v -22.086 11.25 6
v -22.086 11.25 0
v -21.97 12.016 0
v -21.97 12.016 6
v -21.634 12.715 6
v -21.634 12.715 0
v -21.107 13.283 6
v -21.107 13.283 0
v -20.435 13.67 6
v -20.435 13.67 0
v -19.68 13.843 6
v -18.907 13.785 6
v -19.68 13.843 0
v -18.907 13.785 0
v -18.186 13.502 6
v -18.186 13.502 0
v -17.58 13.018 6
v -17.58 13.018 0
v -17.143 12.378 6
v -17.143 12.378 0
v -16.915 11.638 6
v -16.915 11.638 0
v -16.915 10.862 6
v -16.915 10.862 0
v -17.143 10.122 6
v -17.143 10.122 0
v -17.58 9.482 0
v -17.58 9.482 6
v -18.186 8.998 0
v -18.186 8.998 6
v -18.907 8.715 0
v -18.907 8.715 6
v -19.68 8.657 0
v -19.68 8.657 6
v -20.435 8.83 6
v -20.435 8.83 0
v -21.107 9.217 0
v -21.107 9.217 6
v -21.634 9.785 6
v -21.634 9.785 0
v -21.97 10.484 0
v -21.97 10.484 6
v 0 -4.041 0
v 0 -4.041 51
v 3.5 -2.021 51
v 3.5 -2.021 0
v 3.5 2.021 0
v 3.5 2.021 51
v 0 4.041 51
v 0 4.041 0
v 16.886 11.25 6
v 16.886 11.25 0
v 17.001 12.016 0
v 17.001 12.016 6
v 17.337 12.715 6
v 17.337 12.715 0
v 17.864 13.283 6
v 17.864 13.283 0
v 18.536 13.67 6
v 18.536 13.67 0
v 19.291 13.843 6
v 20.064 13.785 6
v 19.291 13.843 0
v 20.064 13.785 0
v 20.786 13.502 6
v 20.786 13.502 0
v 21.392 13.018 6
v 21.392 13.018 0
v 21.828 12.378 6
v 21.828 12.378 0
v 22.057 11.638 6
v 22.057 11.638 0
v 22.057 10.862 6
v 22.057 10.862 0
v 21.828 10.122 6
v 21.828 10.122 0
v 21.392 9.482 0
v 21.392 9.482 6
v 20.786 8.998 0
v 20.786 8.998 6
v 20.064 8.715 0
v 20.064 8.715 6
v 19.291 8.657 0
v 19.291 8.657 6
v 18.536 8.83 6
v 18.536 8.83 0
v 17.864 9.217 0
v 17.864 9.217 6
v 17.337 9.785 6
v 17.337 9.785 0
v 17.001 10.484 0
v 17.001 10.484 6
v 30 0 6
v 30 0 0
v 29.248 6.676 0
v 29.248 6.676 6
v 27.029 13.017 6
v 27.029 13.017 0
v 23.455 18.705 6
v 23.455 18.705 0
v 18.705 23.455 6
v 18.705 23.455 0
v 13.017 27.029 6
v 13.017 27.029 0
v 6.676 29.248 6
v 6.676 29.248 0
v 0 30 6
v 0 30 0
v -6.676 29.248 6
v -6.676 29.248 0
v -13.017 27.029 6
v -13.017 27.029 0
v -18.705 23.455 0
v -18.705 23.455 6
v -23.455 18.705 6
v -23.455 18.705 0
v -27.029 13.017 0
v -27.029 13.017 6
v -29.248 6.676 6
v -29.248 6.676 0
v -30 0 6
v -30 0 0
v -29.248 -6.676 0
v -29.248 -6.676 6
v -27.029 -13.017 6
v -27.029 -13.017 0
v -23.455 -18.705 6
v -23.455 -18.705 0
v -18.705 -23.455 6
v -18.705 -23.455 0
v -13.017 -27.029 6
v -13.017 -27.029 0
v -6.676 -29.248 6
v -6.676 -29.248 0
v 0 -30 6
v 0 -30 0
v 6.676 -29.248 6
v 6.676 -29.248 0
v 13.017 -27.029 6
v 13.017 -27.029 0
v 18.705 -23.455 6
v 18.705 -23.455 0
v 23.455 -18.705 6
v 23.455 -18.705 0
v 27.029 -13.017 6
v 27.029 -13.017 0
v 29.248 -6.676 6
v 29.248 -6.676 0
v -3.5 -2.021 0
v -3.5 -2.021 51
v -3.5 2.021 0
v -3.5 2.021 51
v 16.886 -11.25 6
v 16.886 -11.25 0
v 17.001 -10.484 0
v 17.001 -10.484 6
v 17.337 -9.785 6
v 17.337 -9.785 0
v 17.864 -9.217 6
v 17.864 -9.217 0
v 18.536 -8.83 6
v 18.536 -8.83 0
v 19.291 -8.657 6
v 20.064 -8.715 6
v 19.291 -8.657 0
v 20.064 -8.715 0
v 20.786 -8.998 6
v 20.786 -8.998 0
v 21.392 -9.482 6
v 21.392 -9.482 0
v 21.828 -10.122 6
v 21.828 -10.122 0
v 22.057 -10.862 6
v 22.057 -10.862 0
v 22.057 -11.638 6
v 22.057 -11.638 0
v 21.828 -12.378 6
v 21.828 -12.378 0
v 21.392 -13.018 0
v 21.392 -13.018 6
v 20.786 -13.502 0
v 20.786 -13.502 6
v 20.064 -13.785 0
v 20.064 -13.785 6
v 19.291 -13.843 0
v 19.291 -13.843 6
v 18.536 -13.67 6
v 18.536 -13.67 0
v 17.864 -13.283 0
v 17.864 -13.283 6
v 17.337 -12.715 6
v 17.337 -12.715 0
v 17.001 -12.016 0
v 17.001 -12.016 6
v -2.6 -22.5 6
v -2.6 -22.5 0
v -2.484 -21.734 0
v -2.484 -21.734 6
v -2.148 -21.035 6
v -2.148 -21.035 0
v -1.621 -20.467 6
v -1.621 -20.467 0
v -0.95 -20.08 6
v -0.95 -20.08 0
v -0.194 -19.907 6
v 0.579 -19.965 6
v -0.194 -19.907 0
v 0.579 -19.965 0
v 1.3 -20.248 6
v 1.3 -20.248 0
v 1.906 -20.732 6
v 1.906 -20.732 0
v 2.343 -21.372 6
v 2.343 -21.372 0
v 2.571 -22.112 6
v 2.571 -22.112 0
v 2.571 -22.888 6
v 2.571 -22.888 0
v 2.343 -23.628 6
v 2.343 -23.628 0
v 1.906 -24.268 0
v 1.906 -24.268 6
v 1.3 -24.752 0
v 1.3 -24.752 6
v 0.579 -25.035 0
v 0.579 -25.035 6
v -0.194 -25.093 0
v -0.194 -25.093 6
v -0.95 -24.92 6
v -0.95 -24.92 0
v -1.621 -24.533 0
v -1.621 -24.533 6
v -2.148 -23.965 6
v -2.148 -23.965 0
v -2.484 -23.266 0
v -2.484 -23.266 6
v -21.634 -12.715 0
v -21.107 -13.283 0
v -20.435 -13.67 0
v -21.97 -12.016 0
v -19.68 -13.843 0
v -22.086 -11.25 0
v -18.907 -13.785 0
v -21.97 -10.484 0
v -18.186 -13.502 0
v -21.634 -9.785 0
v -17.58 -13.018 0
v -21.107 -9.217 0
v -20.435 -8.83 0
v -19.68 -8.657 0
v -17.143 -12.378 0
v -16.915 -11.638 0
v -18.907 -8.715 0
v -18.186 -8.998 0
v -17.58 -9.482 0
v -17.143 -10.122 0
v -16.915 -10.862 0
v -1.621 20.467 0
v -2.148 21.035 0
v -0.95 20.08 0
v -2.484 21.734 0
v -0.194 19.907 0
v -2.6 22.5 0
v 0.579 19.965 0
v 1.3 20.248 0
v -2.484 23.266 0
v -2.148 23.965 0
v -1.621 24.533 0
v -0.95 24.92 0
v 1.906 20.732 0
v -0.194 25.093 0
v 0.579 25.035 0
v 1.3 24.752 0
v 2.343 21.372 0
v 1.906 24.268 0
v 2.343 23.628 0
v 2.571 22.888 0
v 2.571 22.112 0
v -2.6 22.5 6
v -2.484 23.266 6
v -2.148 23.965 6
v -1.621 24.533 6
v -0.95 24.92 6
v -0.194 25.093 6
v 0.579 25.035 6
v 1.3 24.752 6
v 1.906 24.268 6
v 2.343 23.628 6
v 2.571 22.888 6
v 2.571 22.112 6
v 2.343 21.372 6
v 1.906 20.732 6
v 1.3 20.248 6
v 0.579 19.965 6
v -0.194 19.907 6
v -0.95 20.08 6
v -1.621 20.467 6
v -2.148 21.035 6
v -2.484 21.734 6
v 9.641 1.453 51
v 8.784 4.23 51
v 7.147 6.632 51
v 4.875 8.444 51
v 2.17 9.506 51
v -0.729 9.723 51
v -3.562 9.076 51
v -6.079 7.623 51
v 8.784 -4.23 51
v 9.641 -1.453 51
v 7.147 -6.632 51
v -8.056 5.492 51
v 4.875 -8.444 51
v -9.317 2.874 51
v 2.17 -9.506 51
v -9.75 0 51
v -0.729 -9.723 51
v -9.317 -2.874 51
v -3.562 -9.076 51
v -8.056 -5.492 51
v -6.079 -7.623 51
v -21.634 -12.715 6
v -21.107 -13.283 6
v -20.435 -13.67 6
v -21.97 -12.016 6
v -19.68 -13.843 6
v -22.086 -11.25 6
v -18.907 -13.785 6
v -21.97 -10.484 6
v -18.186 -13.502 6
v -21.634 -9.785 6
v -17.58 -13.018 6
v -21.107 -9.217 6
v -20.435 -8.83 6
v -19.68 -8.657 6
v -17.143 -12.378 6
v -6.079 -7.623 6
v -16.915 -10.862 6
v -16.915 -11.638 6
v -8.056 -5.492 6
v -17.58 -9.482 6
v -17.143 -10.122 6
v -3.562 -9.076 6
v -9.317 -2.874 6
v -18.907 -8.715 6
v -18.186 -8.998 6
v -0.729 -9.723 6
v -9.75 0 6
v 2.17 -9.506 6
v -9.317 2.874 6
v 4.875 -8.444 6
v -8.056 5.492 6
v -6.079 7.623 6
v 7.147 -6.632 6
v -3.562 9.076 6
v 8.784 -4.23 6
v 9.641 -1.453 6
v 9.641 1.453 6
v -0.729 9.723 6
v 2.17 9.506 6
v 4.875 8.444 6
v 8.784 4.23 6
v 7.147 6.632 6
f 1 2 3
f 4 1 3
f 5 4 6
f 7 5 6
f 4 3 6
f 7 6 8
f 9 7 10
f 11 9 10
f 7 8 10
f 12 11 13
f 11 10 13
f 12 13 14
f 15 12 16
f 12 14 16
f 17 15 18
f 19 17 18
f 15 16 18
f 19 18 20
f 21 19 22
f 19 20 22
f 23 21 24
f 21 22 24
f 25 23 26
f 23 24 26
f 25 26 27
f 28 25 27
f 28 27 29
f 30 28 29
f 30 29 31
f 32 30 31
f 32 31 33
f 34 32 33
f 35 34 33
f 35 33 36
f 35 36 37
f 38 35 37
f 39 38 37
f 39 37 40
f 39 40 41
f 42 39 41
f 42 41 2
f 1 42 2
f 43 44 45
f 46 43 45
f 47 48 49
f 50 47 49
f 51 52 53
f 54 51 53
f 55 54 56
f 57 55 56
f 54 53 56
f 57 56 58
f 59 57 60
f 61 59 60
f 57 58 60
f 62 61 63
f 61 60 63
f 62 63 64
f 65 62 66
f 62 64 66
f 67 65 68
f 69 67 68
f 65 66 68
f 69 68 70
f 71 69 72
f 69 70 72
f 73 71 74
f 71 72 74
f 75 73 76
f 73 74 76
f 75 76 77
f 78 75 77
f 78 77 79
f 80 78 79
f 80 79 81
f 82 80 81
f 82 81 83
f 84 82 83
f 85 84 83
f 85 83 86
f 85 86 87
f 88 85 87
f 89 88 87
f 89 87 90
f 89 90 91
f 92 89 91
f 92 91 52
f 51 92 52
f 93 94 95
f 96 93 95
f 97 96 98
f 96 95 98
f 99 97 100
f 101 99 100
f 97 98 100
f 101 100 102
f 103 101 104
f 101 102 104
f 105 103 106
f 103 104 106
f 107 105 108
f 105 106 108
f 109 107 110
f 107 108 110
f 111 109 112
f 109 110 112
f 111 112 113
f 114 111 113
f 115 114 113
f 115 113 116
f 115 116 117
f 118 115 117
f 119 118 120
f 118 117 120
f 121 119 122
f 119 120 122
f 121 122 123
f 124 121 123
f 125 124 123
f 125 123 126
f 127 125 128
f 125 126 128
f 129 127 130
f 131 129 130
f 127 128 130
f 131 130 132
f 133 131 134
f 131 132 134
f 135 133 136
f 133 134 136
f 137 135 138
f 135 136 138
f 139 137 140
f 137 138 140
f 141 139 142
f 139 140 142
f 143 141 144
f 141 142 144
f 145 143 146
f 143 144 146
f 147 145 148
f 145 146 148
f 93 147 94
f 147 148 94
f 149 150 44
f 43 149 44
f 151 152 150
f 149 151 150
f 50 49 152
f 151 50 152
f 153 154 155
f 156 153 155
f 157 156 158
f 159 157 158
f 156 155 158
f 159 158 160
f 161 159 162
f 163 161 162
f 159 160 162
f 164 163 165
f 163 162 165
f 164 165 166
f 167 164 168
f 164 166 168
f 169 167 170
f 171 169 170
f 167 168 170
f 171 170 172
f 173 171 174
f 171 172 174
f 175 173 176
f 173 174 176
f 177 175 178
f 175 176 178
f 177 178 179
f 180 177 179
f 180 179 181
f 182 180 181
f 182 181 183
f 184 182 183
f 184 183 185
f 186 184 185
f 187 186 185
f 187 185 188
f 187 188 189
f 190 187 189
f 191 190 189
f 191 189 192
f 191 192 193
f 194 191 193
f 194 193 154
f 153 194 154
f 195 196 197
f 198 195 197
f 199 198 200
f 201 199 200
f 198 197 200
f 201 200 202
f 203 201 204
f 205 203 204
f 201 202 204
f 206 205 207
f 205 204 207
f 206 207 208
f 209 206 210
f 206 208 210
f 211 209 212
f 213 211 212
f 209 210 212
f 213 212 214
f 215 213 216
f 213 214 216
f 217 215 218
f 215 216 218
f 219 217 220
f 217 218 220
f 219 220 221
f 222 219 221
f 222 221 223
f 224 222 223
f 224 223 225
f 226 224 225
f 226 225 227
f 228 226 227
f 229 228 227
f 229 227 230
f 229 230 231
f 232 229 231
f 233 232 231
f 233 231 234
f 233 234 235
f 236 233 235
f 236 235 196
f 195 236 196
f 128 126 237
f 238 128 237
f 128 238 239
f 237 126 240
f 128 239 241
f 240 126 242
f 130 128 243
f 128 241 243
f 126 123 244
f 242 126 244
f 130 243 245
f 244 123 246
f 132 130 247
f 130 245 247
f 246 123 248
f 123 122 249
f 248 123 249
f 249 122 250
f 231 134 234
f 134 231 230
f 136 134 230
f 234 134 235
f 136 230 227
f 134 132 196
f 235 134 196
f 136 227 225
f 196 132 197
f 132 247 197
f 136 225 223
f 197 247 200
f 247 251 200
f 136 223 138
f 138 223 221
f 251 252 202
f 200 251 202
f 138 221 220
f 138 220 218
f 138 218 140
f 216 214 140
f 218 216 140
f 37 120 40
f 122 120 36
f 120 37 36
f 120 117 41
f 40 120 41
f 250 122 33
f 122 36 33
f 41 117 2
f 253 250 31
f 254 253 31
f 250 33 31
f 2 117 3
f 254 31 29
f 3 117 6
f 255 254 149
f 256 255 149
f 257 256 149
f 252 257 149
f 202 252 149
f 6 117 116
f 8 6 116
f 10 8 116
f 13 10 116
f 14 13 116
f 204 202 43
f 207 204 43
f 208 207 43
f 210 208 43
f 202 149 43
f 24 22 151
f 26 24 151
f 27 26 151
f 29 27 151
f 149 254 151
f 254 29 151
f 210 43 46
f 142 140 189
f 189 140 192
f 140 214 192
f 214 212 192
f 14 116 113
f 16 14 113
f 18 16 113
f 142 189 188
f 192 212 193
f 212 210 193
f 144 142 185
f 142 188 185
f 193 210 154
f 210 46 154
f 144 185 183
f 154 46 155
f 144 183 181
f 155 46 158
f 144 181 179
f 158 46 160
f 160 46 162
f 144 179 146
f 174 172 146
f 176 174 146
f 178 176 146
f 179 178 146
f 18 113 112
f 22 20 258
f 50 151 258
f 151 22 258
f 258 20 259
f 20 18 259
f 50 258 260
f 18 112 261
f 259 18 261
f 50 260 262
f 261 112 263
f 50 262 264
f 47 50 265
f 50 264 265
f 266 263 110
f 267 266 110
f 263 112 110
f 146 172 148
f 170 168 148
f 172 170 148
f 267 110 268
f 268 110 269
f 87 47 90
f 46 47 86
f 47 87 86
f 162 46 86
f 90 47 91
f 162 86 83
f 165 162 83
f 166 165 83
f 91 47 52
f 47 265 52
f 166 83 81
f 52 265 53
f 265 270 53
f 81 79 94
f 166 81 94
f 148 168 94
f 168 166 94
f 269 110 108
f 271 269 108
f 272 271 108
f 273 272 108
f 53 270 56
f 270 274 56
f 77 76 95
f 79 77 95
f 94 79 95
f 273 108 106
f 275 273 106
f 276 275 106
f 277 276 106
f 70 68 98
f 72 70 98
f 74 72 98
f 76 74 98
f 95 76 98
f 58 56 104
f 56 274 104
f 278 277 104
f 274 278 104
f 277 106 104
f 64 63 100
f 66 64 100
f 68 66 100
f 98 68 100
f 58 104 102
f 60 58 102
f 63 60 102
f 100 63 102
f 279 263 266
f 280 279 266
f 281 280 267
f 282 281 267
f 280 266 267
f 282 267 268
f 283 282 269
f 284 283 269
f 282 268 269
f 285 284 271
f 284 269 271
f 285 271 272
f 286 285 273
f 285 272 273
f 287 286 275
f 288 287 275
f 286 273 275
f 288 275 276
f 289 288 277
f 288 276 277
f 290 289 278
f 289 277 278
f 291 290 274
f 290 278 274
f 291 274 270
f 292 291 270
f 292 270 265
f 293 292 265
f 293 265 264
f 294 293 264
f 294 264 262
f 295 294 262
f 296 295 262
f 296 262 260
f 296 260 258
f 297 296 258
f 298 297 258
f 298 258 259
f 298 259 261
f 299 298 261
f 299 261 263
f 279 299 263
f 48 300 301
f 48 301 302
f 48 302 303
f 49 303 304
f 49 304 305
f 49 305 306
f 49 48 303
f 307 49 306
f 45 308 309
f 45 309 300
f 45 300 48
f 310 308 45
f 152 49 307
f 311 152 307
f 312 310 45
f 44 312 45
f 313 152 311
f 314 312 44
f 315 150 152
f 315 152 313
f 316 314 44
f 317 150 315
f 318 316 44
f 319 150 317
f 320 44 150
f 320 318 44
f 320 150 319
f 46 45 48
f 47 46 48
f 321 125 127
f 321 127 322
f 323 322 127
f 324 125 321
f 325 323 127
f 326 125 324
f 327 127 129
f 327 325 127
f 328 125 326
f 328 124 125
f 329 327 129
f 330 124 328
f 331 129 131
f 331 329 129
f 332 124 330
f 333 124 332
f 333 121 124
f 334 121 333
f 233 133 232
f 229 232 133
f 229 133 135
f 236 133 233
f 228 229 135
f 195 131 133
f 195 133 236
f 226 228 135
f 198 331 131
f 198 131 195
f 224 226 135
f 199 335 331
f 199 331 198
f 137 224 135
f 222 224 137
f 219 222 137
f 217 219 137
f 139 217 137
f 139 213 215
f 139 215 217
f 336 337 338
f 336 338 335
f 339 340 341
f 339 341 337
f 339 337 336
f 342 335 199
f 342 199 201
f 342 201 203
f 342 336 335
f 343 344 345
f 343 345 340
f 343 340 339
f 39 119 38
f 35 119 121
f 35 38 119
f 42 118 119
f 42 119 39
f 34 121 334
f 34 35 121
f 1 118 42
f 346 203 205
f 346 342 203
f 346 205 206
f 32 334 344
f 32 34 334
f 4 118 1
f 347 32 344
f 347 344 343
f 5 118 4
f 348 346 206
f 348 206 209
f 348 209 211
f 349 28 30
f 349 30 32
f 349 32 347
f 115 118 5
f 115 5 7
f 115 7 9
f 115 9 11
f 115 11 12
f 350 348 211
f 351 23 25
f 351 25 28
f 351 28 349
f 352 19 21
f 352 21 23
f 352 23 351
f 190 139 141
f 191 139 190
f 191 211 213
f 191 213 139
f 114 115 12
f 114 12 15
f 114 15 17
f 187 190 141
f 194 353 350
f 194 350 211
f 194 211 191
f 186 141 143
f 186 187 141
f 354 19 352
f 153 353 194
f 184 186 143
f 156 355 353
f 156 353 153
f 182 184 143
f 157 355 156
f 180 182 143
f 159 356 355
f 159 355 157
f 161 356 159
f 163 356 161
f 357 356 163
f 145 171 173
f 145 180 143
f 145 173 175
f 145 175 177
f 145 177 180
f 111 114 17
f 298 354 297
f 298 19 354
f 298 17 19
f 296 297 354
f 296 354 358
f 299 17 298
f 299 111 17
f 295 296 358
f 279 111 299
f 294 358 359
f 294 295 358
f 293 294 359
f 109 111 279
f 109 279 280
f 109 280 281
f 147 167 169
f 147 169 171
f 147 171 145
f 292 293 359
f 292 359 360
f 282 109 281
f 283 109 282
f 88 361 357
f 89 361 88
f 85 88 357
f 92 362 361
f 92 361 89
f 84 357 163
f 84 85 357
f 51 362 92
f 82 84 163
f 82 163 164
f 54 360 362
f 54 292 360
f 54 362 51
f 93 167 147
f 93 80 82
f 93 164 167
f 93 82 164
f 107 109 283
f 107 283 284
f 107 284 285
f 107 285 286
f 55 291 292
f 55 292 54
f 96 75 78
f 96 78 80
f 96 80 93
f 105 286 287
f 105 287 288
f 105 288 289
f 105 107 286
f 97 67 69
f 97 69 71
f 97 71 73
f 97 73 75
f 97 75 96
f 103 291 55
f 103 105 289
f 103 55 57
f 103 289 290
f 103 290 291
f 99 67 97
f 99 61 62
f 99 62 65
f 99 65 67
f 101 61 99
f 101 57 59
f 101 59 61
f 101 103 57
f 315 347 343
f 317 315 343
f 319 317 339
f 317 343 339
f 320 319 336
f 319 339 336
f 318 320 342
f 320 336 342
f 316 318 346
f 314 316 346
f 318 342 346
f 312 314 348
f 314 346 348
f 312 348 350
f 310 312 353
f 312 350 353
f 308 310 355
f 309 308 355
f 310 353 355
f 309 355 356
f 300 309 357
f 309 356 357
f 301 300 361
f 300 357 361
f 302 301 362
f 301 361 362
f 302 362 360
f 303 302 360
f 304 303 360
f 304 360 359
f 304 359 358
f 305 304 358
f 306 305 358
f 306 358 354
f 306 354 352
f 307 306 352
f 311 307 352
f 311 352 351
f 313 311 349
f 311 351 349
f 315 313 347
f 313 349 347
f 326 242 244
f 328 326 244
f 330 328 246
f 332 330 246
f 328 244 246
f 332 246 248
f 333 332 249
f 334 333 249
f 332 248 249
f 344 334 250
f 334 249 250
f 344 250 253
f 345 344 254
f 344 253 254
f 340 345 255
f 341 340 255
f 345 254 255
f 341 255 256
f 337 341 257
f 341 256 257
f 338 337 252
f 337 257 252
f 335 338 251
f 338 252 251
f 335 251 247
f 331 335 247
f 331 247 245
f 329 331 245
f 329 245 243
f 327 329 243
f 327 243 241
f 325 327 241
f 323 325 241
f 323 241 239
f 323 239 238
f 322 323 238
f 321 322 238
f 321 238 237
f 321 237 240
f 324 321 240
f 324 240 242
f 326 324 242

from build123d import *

# Parameters (mm, degrees)
SKETCH1_R           = 30
BOSS_EXTRUDE1_DEPTH = 6
SKETCH2_R           = 9.75
BOSS_EXTRUDE2_DEPTH = 45
CUT_EXTRUDE1_DEPTH  = 67.340033162
SKETCH5_R           = 2.6
CUT_EXTRUDE3_DEPTH  = 30


with BuildPart() as part:
    # Sketch1 → Boss-Extrude1 (new body)
    with BuildSketch(Plane.XY):
        Circle(SKETCH1_R)
    extrude(amount=BOSS_EXTRUDE1_DEPTH)

    # Sketch2 → Boss-Extrude2 (add)
    with BuildSketch(Plane.XY.offset(6)):
        with Locations(Location((0, 0, 0), (0, 0, 180))):
            Circle(SKETCH2_R)
    extrude(amount=BOSS_EXTRUDE2_DEPTH)

    # Sketch3 → Cut-Extrude1 (cut, through all)
    with BuildSketch(Plane.XY.offset(51)):
        Polygon((0, 4.041451884), (-3.5, 2.020725942), (-3.5, -2.020725942), (0, -4.041451884), (3.5, -2.020725942), (3.5, 2.020725942), align=None)
    extrude(amount=-CUT_EXTRUDE1_DEPTH, mode=Mode.SUBTRACT)

    # Sketch5 → Cut-Extrude3 (cut)
    with BuildSketch(Plane(origin=(0, 0, 0), x_dir=(-1, 0, 0), z_dir=(0, 0, -1))):
        with Locations((0, 22.5)):
            Circle(SKETCH5_R)
        with Locations((19.485571585, 11.25)):
            Circle(SKETCH5_R)
        with Locations((19.485571585, -11.25)):
            Circle(SKETCH5_R)
        with Locations((0, -22.5)):
            Circle(SKETCH5_R)
        with Locations((-19.485571585, -11.25)):
            Circle(SKETCH5_R)
        with Locations((-19.485571585, 11.25)):
            Circle(SKETCH5_R)
    extrude(amount=-CUT_EXTRUDE3_DEPTH, mode=Mode.SUBTRACT)


solid = part.part
